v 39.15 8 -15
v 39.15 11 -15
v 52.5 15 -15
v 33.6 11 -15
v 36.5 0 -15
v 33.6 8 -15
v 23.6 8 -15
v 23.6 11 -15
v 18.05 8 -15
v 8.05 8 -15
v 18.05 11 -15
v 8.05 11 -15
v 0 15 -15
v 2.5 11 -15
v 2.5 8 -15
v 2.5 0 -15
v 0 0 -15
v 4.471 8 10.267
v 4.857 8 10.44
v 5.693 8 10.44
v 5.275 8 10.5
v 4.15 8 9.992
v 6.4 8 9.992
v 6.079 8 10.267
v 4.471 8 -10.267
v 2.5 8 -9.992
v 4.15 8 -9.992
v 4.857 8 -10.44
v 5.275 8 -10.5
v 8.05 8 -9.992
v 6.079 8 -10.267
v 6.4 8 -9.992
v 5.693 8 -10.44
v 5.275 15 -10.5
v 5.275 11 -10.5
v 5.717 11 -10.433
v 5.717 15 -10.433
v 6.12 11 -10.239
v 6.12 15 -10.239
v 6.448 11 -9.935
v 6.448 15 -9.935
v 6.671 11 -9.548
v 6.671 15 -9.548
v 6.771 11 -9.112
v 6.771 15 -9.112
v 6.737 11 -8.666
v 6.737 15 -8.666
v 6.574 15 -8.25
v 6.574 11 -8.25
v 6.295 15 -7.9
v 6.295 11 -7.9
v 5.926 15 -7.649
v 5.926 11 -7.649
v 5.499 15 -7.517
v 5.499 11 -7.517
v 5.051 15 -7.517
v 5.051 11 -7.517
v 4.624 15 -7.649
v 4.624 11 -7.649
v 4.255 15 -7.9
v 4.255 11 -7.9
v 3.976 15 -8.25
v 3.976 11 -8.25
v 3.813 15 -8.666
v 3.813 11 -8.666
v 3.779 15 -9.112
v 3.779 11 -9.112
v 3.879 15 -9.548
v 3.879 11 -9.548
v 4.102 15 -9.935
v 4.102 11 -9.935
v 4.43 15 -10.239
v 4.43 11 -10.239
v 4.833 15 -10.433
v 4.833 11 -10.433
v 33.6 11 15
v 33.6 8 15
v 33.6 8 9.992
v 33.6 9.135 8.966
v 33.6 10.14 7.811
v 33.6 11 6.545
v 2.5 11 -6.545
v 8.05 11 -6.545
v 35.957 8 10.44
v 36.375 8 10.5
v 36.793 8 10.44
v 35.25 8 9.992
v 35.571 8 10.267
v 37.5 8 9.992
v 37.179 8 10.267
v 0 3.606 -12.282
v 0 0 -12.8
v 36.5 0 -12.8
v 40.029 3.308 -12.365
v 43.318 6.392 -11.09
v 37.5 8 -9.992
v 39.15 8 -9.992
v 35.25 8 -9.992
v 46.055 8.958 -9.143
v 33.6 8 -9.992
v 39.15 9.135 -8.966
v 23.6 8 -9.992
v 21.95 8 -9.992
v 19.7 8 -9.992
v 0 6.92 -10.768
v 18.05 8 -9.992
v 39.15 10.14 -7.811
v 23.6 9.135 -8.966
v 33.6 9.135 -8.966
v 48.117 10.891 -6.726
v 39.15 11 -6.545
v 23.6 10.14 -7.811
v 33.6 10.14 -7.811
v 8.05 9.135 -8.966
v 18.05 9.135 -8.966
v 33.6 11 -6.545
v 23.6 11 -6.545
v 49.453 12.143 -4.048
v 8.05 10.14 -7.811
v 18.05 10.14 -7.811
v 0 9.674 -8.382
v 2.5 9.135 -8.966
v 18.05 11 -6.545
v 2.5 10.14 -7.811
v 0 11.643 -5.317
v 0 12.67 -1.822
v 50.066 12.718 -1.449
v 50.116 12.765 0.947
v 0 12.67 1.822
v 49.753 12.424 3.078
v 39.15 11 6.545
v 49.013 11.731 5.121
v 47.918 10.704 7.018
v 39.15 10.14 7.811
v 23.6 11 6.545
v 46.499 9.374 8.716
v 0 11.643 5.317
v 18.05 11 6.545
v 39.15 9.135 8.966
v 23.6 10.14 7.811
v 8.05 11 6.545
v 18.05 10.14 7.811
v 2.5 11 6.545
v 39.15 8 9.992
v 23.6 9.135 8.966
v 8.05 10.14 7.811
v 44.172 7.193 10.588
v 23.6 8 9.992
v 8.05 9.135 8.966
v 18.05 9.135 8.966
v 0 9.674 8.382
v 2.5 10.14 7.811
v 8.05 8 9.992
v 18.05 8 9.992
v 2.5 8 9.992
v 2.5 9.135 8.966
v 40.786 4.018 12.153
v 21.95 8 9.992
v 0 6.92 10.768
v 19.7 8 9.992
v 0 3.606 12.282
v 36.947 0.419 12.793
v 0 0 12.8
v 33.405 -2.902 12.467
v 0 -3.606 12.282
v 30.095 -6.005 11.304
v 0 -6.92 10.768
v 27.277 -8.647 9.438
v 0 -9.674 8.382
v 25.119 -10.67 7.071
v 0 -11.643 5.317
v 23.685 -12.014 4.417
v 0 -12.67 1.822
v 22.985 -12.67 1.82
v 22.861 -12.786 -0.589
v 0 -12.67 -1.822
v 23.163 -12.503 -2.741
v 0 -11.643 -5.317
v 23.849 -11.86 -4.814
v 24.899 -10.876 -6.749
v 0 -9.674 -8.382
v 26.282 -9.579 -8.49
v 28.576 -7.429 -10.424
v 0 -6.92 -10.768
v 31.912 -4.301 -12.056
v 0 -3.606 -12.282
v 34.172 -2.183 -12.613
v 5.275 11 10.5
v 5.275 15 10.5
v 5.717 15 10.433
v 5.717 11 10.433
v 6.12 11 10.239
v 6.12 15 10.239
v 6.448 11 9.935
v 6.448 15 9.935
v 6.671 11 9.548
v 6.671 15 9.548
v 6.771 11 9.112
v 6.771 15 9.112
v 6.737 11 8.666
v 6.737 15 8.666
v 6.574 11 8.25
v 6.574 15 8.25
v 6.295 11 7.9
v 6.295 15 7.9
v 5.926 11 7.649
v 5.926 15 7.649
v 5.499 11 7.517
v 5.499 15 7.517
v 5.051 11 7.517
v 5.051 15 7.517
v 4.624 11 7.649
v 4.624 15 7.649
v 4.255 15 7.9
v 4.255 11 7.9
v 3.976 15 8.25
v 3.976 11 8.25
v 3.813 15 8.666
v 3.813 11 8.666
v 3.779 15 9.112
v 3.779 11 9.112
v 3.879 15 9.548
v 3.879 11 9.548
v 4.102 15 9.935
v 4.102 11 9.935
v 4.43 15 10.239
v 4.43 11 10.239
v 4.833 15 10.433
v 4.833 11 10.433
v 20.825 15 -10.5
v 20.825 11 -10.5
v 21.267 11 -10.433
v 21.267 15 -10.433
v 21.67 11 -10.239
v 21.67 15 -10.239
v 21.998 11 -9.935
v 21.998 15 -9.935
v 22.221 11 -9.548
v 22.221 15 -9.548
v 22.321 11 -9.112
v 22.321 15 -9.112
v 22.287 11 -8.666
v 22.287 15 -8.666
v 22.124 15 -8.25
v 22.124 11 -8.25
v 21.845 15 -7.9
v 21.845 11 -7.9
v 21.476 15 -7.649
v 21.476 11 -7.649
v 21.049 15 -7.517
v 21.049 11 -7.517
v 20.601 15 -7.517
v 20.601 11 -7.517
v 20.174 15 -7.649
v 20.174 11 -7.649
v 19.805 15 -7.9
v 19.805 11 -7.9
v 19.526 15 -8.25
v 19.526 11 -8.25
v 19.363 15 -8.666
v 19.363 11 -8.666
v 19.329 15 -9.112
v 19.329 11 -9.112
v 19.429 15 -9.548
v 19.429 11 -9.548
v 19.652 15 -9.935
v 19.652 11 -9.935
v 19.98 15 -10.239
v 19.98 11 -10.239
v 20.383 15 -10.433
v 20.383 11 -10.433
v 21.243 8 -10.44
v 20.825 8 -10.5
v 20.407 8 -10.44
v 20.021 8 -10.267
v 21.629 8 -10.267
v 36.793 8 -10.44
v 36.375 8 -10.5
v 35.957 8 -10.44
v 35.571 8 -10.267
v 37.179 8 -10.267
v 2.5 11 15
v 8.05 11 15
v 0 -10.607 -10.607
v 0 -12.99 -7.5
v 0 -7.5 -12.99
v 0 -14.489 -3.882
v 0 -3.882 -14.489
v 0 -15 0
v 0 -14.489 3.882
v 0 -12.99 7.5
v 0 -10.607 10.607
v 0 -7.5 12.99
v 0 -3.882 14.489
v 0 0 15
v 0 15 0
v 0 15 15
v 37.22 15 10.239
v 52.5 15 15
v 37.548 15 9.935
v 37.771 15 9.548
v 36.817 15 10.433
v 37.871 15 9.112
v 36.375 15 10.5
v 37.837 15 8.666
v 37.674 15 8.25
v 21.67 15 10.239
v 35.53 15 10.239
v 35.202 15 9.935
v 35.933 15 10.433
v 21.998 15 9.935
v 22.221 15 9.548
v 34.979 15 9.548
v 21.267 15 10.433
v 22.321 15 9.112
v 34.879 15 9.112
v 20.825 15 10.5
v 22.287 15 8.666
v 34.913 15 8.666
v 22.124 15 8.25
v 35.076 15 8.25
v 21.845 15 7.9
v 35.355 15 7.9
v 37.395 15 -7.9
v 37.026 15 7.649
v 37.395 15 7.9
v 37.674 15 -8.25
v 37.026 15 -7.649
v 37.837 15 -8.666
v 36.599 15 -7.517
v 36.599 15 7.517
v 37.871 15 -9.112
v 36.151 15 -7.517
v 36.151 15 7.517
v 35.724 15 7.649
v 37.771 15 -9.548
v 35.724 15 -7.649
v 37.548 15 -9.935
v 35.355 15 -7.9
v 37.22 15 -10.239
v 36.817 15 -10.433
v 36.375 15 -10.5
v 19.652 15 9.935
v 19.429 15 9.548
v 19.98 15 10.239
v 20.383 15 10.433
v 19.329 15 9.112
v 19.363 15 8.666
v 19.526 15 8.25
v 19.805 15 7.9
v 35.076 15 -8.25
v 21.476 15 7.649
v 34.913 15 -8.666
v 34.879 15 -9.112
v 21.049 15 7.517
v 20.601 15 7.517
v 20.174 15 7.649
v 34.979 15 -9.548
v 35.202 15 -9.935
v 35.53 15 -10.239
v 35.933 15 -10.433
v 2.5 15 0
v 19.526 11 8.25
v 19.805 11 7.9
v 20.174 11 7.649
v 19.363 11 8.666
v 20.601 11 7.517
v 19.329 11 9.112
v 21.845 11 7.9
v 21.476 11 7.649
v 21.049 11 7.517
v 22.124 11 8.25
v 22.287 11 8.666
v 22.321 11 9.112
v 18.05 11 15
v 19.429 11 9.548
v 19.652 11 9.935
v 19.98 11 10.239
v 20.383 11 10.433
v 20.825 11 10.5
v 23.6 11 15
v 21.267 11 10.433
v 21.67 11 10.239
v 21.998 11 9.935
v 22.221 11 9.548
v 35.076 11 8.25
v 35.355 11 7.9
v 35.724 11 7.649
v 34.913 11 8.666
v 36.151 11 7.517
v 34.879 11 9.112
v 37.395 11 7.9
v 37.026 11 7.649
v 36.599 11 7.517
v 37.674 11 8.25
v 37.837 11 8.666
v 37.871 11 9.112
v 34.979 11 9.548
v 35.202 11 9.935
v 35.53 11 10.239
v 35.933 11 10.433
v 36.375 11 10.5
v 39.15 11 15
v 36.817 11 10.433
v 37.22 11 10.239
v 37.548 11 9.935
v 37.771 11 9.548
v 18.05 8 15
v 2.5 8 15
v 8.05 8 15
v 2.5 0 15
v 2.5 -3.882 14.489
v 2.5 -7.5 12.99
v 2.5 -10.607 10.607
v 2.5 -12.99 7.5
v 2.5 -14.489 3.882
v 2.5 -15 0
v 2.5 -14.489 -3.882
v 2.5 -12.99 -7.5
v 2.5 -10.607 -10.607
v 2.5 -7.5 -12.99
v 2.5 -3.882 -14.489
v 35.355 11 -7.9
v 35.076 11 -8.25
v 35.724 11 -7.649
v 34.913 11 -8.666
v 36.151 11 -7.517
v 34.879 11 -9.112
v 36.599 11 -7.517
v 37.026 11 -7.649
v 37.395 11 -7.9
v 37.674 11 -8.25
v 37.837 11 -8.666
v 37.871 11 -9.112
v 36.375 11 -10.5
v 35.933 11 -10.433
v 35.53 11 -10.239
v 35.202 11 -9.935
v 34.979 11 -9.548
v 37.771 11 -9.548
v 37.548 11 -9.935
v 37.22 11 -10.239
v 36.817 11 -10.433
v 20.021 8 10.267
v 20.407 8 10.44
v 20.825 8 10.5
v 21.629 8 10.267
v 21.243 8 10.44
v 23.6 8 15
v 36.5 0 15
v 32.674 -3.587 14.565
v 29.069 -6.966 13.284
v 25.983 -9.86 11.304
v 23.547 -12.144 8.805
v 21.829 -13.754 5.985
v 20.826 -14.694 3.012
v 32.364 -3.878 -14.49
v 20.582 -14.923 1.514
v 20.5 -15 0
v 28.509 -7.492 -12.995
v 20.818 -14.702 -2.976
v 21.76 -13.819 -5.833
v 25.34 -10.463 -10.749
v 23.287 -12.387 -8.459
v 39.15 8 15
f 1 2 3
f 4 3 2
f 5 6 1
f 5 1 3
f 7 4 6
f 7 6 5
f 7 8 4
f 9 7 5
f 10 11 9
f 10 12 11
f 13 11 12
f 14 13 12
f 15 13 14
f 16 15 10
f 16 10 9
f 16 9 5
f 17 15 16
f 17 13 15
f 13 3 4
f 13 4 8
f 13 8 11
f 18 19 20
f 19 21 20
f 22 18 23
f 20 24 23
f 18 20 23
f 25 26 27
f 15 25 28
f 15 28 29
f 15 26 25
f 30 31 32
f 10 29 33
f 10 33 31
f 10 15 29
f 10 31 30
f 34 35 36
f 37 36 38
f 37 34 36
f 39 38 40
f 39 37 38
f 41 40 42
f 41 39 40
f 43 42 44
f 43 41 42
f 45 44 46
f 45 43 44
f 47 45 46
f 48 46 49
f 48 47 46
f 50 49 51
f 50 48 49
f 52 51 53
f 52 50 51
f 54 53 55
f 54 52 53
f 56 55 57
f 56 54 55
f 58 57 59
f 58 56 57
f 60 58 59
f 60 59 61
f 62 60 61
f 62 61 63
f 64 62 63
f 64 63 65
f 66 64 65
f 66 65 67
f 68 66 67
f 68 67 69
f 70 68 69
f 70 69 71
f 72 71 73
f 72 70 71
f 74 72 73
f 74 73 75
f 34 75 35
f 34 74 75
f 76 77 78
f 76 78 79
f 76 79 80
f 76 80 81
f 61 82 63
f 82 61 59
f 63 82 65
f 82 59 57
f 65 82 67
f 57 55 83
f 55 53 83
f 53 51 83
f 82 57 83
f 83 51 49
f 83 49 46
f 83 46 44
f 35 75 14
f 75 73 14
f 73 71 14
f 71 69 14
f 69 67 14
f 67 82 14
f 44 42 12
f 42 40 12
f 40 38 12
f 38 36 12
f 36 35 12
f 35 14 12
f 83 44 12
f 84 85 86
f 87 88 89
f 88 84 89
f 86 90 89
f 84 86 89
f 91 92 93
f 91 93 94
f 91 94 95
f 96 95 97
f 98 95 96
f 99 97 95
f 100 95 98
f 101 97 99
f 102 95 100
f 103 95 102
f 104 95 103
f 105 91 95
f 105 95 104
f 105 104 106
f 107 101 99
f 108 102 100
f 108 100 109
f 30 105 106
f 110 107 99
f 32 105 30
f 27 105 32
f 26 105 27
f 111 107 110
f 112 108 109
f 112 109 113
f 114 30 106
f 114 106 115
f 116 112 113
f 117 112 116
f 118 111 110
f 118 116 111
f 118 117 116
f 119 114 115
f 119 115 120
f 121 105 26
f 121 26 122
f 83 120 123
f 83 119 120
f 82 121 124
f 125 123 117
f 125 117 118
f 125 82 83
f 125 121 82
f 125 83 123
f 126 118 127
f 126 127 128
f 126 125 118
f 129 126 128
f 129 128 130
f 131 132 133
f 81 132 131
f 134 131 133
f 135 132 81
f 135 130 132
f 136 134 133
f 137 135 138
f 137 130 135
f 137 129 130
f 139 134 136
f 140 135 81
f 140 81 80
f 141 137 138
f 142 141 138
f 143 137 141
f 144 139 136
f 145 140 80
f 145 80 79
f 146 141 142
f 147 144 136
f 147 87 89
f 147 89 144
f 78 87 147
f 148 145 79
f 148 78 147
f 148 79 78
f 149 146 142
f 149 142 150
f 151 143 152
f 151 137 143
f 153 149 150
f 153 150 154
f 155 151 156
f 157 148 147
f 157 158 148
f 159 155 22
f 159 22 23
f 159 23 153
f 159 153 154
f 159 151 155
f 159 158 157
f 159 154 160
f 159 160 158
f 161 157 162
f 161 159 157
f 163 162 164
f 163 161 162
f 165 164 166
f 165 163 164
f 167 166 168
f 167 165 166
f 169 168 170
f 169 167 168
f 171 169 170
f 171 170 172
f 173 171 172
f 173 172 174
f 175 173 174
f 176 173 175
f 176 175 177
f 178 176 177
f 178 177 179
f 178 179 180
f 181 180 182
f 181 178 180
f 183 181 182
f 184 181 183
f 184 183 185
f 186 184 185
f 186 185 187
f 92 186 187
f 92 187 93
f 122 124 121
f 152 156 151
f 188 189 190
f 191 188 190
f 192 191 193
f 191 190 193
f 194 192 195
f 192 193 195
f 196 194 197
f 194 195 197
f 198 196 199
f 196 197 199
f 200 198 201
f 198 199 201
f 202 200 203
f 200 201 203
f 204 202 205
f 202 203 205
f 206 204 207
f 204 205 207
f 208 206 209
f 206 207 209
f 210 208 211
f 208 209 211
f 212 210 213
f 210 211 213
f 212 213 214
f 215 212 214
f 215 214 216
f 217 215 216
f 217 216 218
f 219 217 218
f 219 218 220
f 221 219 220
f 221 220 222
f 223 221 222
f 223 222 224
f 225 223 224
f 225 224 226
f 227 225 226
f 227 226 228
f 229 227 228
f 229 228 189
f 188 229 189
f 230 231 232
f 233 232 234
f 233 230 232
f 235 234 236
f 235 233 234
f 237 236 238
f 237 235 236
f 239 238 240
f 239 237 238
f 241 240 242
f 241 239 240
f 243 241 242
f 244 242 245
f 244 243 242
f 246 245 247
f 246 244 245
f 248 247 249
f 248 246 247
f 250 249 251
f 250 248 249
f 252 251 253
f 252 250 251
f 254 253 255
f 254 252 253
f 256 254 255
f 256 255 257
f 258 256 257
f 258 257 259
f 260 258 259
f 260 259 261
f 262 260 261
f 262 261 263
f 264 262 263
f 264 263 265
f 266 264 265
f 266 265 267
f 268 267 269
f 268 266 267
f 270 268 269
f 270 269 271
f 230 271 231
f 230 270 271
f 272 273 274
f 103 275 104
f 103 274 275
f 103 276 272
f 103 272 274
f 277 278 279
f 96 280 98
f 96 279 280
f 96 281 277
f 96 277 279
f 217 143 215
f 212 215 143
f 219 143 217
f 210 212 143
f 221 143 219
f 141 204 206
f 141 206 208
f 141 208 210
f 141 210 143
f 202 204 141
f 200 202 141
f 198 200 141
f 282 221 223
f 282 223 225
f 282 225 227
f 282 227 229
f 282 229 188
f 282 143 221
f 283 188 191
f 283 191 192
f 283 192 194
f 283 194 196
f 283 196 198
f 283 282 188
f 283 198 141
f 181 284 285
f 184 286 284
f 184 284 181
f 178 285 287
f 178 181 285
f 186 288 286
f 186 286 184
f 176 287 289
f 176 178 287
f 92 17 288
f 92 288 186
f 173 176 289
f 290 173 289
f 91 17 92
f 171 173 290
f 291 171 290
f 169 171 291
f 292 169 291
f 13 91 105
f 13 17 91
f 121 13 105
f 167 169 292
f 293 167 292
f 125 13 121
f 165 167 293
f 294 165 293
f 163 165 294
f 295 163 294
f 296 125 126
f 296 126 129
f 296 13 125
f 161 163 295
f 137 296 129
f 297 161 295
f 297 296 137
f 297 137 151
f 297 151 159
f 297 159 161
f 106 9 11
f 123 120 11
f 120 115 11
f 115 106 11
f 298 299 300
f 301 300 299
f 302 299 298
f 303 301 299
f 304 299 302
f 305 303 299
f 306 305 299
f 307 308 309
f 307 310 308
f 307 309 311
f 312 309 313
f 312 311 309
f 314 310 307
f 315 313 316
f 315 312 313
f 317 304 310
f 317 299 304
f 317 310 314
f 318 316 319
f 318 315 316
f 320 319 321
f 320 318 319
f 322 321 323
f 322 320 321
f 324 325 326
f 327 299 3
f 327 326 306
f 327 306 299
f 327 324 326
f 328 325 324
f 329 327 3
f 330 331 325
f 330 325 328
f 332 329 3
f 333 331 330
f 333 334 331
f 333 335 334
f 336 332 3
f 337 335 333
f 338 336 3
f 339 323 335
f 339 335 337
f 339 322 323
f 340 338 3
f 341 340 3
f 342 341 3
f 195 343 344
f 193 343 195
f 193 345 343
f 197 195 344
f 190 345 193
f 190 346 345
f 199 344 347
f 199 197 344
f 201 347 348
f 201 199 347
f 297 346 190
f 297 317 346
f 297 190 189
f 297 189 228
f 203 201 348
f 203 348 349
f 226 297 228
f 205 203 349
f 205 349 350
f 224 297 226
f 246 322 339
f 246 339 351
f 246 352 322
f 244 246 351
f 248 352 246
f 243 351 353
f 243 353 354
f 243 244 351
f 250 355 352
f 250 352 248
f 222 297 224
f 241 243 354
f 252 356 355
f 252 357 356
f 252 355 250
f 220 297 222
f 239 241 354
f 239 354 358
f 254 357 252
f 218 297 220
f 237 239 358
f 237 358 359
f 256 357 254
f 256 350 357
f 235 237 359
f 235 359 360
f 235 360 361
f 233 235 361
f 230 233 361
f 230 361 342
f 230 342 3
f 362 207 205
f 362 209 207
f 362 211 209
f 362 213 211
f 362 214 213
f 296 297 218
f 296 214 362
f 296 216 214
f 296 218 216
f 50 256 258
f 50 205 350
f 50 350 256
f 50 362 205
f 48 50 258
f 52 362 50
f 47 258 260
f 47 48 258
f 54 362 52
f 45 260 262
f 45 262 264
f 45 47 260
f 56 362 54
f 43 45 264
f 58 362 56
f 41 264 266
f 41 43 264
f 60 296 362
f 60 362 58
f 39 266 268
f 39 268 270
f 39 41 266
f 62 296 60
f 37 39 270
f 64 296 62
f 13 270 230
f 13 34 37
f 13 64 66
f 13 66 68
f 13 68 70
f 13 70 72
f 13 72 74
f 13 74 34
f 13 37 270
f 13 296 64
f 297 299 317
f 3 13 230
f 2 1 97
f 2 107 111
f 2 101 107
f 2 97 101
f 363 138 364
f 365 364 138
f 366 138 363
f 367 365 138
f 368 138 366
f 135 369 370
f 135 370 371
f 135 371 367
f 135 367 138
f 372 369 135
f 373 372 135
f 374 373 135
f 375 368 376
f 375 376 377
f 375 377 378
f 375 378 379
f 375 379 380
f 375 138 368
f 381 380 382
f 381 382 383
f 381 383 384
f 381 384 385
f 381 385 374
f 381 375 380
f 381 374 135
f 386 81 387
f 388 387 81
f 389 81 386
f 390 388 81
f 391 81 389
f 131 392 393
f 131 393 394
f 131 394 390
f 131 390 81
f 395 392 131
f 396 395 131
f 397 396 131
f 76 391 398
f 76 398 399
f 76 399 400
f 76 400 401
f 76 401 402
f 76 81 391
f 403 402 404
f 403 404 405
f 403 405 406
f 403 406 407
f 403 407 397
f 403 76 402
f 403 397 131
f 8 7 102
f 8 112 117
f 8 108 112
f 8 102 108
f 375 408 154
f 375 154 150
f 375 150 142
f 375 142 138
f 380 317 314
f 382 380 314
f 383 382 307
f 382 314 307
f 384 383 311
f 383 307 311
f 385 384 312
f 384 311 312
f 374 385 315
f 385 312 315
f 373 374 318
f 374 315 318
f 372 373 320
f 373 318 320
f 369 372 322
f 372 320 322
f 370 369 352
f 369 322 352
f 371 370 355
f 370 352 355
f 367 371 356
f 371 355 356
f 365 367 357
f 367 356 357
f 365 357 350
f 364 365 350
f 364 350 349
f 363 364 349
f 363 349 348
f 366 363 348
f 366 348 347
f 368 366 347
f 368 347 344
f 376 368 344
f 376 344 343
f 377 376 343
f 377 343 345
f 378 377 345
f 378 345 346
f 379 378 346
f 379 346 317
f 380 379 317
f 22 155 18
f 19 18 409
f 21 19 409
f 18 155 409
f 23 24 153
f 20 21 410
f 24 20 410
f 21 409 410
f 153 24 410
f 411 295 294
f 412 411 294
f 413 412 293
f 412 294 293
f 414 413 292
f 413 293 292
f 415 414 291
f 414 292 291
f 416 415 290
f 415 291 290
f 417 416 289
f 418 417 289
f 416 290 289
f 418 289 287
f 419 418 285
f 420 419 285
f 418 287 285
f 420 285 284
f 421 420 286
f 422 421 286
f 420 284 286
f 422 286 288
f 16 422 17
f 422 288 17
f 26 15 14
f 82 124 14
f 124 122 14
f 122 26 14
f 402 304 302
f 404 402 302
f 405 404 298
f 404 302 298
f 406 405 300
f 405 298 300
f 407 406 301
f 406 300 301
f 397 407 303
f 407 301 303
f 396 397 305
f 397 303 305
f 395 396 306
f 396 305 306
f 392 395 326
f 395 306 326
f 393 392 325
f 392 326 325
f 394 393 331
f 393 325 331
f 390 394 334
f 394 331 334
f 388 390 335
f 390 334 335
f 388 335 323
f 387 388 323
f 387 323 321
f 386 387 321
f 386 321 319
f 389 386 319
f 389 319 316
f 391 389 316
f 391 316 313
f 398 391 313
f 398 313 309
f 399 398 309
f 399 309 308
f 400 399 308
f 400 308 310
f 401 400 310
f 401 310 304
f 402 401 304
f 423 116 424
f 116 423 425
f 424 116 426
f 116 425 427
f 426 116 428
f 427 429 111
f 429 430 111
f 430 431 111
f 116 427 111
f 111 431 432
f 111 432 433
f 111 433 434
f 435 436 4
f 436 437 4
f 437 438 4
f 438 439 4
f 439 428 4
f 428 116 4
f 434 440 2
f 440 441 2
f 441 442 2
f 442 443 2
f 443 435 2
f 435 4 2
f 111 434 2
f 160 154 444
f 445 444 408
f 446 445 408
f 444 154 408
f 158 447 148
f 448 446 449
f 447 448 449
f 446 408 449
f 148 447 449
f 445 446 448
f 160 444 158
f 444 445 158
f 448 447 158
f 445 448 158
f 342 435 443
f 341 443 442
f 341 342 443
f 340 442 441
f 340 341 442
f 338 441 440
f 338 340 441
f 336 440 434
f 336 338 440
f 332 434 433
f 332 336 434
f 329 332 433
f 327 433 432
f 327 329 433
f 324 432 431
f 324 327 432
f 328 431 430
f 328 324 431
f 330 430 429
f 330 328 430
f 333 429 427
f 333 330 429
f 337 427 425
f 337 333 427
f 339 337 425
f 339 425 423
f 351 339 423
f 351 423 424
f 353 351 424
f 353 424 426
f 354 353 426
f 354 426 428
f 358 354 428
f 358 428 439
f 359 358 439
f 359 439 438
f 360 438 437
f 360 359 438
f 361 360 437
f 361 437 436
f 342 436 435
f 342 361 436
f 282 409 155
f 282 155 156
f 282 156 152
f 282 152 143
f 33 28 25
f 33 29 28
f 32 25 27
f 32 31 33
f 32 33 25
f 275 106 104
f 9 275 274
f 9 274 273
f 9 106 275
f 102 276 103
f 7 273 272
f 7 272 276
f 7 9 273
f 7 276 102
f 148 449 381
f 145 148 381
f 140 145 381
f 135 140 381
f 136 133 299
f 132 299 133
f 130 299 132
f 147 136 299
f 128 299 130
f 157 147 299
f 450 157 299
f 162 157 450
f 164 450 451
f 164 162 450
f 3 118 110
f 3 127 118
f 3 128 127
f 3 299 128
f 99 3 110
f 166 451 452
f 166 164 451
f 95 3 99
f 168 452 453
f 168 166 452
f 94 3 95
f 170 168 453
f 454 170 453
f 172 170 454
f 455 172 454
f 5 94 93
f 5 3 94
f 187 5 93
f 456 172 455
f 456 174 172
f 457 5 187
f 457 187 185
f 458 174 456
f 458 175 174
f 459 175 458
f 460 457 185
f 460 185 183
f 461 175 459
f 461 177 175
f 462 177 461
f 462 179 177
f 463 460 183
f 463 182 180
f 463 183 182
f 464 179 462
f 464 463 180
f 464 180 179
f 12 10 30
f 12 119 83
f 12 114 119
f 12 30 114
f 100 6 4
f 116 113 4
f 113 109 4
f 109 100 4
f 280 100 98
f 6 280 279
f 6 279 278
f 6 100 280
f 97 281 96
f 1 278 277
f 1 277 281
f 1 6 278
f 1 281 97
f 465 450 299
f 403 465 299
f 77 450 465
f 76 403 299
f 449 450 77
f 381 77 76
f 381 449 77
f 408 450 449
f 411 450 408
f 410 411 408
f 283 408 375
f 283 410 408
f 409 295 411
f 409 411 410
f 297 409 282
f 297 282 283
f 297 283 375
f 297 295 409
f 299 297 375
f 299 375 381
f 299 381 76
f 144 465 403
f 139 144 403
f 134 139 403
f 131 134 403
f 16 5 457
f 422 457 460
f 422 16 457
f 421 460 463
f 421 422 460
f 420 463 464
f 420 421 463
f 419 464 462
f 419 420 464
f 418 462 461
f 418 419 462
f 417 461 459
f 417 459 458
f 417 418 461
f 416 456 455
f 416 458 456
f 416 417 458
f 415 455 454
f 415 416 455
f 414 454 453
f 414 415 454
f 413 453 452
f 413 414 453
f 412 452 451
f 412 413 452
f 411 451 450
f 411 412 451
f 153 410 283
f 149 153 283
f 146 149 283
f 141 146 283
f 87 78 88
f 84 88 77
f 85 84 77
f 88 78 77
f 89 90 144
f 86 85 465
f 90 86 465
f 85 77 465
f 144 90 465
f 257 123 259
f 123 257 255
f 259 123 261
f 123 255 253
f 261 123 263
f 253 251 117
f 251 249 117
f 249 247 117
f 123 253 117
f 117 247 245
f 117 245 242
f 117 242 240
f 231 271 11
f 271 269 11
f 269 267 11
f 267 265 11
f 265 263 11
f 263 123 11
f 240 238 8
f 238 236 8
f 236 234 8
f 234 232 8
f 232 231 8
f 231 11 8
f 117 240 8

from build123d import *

# Parameters (mm, degrees)
SKETCH1_R                = 15
SKETCH1_R_2              = 12.85
BOSS_EXTRUDE1_DEPTH      = 2.5
BOSS_EXTRUDE2_DEPTH      = 50
BOSS_EXTRUDE2_DEPTH_BACK = 2.5
SKETCH2_R                = 12.8
CUT_EXTRUDE1_DEPTH       = 57.623758265
CUT_EXTRUDE1_DEPTH_BACK  = 57.623758265
SKETCH4_W                = 5.55
SKETCH4_H                = 3
CUT_EXTRUDE2_DEPTH       = 9
SKETCH5_R                = 1.5
CUT_EXTRUDE3_DEPTH       = 7


with BuildPart() as part:
    # Sketch1 → Boss-Extrude1 (new body)
    with BuildSketch(Plane(origin=(0, 0, 0), x_dir=(0, 0, -1), z_dir=(1, 0, 0))):
        Circle(SKETCH1_R)
        Circle(SKETCH1_R_2, mode=Mode.SUBTRACT)
    extrude(amount=BOSS_EXTRUDE1_DEPTH)

    # Sketch2 → Boss-Extrude2 (add, two sides: drawn at the far end of the back side and taken through both)
    with BuildSketch(Plane(origin=(2.5, 0, 0), x_dir=(0, 0, -1), z_dir=(1, 0, 0)).offset(-BOSS_EXTRUDE2_DEPTH_BACK)):
        with BuildLine():
            Line((-15, 15), (15, 15))
            Line((15, 15), (15, 0))
            ThreePointArc((15, 0), (0, -15), (-15, 0))
            Line((-15, 0), (-15, 15))
        make_face()
        Circle(SKETCH2_R, mode=Mode.SUBTRACT)
    extrude(amount=BOSS_EXTRUDE2_DEPTH + BOSS_EXTRUDE2_DEPTH_BACK)

    # Sketch3 → Cut-Extrude1 (cut, two sides: drawn at the far end of the back side and taken through both)
    with BuildSketch(Plane.XY.offset(-CUT_EXTRUDE1_DEPTH_BACK)):
        Polygon((52.5, 15), (20.5, -15), (52.5, -15), align=None)
    extrude(amount=CUT_EXTRUDE1_DEPTH + CUT_EXTRUDE1_DEPTH_BACK, mode=Mode.SUBTRACT)

    # Sketch4 → Cut-Extrude2 (cut)
    with BuildSketch(Plane.XY.offset(15)):
        with Locations((5.275, 9.5)):
            Rectangle(SKETCH4_W, SKETCH4_H)
        with Locations((20.825, 9.5)):
            Rectangle(SKETCH4_W, SKETCH4_H)
        with Locations((36.375, 9.5)):
            Rectangle(SKETCH4_W, SKETCH4_H)
    cut_extrude2 = extrude(amount=-CUT_EXTRUDE2_DEPTH, mode=Mode.SUBTRACT)

    # Sketch5 → Cut-Extrude3 (cut)
    with BuildSketch(Plane(origin=(0, 15, 0), x_dir=(1, 0, 0), z_dir=(0, 1, 0))):
        with Locations(Location((5.275, -9, 0), (0, 0, 270))):
            Circle(SKETCH5_R)
        with Locations(Location((20.825, -9, 0), (0, 0, 270))):
            Circle(SKETCH5_R)
        with Locations(Location((36.375, -9, 0), (0, 0, 270))):
            Circle(SKETCH5_R)
    cut_extrude3 = extrude(amount=-CUT_EXTRUDE3_DEPTH, mode=Mode.SUBTRACT)

    # Mirror1: Cut-Extrude2, Cut-Extrude3 across plane
    add(cut_extrude2.mirror(Plane.XY), mode=Mode.SUBTRACT)
    add(cut_extrude3.mirror(Plane.XY), mode=Mode.SUBTRACT)


solid = part.part
